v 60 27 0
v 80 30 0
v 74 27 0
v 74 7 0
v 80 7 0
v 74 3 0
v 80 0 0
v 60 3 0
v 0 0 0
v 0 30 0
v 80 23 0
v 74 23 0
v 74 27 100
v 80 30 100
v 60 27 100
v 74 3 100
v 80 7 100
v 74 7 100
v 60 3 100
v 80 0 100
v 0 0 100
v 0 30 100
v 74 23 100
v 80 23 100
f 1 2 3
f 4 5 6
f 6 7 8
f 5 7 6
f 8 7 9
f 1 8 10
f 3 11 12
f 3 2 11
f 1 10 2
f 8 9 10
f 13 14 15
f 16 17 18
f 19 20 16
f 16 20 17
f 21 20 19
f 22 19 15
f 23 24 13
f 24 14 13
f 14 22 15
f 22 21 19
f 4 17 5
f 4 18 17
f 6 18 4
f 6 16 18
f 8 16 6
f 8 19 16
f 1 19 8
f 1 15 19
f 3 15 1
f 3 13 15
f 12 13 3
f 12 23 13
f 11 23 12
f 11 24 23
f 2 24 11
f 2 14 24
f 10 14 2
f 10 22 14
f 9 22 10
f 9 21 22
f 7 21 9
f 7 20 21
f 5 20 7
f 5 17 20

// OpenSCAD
$fn = 32;

// ----------------------------------------------------------------------
// T-slot rail: 80 x 30 mm section, 100 mm long
// ----------------------------------------------------------------------

// --- parameters (mm) ---
profile_height = 100;     // extrusion height
profile_points = 12;      // points of the closed outline

profile = [[0, 0], [80, 0], [80, 7], [74, 7], [74, 3], [60, 3], [60, 27], [74, 27], [74, 23], [80, 23], [80, 30], [0, 30]];  // single closed polygon, 12 points, counter clockwise

// --- the one profile operation ---
linear_extrude(height = profile_height) polygon(points = profile);
